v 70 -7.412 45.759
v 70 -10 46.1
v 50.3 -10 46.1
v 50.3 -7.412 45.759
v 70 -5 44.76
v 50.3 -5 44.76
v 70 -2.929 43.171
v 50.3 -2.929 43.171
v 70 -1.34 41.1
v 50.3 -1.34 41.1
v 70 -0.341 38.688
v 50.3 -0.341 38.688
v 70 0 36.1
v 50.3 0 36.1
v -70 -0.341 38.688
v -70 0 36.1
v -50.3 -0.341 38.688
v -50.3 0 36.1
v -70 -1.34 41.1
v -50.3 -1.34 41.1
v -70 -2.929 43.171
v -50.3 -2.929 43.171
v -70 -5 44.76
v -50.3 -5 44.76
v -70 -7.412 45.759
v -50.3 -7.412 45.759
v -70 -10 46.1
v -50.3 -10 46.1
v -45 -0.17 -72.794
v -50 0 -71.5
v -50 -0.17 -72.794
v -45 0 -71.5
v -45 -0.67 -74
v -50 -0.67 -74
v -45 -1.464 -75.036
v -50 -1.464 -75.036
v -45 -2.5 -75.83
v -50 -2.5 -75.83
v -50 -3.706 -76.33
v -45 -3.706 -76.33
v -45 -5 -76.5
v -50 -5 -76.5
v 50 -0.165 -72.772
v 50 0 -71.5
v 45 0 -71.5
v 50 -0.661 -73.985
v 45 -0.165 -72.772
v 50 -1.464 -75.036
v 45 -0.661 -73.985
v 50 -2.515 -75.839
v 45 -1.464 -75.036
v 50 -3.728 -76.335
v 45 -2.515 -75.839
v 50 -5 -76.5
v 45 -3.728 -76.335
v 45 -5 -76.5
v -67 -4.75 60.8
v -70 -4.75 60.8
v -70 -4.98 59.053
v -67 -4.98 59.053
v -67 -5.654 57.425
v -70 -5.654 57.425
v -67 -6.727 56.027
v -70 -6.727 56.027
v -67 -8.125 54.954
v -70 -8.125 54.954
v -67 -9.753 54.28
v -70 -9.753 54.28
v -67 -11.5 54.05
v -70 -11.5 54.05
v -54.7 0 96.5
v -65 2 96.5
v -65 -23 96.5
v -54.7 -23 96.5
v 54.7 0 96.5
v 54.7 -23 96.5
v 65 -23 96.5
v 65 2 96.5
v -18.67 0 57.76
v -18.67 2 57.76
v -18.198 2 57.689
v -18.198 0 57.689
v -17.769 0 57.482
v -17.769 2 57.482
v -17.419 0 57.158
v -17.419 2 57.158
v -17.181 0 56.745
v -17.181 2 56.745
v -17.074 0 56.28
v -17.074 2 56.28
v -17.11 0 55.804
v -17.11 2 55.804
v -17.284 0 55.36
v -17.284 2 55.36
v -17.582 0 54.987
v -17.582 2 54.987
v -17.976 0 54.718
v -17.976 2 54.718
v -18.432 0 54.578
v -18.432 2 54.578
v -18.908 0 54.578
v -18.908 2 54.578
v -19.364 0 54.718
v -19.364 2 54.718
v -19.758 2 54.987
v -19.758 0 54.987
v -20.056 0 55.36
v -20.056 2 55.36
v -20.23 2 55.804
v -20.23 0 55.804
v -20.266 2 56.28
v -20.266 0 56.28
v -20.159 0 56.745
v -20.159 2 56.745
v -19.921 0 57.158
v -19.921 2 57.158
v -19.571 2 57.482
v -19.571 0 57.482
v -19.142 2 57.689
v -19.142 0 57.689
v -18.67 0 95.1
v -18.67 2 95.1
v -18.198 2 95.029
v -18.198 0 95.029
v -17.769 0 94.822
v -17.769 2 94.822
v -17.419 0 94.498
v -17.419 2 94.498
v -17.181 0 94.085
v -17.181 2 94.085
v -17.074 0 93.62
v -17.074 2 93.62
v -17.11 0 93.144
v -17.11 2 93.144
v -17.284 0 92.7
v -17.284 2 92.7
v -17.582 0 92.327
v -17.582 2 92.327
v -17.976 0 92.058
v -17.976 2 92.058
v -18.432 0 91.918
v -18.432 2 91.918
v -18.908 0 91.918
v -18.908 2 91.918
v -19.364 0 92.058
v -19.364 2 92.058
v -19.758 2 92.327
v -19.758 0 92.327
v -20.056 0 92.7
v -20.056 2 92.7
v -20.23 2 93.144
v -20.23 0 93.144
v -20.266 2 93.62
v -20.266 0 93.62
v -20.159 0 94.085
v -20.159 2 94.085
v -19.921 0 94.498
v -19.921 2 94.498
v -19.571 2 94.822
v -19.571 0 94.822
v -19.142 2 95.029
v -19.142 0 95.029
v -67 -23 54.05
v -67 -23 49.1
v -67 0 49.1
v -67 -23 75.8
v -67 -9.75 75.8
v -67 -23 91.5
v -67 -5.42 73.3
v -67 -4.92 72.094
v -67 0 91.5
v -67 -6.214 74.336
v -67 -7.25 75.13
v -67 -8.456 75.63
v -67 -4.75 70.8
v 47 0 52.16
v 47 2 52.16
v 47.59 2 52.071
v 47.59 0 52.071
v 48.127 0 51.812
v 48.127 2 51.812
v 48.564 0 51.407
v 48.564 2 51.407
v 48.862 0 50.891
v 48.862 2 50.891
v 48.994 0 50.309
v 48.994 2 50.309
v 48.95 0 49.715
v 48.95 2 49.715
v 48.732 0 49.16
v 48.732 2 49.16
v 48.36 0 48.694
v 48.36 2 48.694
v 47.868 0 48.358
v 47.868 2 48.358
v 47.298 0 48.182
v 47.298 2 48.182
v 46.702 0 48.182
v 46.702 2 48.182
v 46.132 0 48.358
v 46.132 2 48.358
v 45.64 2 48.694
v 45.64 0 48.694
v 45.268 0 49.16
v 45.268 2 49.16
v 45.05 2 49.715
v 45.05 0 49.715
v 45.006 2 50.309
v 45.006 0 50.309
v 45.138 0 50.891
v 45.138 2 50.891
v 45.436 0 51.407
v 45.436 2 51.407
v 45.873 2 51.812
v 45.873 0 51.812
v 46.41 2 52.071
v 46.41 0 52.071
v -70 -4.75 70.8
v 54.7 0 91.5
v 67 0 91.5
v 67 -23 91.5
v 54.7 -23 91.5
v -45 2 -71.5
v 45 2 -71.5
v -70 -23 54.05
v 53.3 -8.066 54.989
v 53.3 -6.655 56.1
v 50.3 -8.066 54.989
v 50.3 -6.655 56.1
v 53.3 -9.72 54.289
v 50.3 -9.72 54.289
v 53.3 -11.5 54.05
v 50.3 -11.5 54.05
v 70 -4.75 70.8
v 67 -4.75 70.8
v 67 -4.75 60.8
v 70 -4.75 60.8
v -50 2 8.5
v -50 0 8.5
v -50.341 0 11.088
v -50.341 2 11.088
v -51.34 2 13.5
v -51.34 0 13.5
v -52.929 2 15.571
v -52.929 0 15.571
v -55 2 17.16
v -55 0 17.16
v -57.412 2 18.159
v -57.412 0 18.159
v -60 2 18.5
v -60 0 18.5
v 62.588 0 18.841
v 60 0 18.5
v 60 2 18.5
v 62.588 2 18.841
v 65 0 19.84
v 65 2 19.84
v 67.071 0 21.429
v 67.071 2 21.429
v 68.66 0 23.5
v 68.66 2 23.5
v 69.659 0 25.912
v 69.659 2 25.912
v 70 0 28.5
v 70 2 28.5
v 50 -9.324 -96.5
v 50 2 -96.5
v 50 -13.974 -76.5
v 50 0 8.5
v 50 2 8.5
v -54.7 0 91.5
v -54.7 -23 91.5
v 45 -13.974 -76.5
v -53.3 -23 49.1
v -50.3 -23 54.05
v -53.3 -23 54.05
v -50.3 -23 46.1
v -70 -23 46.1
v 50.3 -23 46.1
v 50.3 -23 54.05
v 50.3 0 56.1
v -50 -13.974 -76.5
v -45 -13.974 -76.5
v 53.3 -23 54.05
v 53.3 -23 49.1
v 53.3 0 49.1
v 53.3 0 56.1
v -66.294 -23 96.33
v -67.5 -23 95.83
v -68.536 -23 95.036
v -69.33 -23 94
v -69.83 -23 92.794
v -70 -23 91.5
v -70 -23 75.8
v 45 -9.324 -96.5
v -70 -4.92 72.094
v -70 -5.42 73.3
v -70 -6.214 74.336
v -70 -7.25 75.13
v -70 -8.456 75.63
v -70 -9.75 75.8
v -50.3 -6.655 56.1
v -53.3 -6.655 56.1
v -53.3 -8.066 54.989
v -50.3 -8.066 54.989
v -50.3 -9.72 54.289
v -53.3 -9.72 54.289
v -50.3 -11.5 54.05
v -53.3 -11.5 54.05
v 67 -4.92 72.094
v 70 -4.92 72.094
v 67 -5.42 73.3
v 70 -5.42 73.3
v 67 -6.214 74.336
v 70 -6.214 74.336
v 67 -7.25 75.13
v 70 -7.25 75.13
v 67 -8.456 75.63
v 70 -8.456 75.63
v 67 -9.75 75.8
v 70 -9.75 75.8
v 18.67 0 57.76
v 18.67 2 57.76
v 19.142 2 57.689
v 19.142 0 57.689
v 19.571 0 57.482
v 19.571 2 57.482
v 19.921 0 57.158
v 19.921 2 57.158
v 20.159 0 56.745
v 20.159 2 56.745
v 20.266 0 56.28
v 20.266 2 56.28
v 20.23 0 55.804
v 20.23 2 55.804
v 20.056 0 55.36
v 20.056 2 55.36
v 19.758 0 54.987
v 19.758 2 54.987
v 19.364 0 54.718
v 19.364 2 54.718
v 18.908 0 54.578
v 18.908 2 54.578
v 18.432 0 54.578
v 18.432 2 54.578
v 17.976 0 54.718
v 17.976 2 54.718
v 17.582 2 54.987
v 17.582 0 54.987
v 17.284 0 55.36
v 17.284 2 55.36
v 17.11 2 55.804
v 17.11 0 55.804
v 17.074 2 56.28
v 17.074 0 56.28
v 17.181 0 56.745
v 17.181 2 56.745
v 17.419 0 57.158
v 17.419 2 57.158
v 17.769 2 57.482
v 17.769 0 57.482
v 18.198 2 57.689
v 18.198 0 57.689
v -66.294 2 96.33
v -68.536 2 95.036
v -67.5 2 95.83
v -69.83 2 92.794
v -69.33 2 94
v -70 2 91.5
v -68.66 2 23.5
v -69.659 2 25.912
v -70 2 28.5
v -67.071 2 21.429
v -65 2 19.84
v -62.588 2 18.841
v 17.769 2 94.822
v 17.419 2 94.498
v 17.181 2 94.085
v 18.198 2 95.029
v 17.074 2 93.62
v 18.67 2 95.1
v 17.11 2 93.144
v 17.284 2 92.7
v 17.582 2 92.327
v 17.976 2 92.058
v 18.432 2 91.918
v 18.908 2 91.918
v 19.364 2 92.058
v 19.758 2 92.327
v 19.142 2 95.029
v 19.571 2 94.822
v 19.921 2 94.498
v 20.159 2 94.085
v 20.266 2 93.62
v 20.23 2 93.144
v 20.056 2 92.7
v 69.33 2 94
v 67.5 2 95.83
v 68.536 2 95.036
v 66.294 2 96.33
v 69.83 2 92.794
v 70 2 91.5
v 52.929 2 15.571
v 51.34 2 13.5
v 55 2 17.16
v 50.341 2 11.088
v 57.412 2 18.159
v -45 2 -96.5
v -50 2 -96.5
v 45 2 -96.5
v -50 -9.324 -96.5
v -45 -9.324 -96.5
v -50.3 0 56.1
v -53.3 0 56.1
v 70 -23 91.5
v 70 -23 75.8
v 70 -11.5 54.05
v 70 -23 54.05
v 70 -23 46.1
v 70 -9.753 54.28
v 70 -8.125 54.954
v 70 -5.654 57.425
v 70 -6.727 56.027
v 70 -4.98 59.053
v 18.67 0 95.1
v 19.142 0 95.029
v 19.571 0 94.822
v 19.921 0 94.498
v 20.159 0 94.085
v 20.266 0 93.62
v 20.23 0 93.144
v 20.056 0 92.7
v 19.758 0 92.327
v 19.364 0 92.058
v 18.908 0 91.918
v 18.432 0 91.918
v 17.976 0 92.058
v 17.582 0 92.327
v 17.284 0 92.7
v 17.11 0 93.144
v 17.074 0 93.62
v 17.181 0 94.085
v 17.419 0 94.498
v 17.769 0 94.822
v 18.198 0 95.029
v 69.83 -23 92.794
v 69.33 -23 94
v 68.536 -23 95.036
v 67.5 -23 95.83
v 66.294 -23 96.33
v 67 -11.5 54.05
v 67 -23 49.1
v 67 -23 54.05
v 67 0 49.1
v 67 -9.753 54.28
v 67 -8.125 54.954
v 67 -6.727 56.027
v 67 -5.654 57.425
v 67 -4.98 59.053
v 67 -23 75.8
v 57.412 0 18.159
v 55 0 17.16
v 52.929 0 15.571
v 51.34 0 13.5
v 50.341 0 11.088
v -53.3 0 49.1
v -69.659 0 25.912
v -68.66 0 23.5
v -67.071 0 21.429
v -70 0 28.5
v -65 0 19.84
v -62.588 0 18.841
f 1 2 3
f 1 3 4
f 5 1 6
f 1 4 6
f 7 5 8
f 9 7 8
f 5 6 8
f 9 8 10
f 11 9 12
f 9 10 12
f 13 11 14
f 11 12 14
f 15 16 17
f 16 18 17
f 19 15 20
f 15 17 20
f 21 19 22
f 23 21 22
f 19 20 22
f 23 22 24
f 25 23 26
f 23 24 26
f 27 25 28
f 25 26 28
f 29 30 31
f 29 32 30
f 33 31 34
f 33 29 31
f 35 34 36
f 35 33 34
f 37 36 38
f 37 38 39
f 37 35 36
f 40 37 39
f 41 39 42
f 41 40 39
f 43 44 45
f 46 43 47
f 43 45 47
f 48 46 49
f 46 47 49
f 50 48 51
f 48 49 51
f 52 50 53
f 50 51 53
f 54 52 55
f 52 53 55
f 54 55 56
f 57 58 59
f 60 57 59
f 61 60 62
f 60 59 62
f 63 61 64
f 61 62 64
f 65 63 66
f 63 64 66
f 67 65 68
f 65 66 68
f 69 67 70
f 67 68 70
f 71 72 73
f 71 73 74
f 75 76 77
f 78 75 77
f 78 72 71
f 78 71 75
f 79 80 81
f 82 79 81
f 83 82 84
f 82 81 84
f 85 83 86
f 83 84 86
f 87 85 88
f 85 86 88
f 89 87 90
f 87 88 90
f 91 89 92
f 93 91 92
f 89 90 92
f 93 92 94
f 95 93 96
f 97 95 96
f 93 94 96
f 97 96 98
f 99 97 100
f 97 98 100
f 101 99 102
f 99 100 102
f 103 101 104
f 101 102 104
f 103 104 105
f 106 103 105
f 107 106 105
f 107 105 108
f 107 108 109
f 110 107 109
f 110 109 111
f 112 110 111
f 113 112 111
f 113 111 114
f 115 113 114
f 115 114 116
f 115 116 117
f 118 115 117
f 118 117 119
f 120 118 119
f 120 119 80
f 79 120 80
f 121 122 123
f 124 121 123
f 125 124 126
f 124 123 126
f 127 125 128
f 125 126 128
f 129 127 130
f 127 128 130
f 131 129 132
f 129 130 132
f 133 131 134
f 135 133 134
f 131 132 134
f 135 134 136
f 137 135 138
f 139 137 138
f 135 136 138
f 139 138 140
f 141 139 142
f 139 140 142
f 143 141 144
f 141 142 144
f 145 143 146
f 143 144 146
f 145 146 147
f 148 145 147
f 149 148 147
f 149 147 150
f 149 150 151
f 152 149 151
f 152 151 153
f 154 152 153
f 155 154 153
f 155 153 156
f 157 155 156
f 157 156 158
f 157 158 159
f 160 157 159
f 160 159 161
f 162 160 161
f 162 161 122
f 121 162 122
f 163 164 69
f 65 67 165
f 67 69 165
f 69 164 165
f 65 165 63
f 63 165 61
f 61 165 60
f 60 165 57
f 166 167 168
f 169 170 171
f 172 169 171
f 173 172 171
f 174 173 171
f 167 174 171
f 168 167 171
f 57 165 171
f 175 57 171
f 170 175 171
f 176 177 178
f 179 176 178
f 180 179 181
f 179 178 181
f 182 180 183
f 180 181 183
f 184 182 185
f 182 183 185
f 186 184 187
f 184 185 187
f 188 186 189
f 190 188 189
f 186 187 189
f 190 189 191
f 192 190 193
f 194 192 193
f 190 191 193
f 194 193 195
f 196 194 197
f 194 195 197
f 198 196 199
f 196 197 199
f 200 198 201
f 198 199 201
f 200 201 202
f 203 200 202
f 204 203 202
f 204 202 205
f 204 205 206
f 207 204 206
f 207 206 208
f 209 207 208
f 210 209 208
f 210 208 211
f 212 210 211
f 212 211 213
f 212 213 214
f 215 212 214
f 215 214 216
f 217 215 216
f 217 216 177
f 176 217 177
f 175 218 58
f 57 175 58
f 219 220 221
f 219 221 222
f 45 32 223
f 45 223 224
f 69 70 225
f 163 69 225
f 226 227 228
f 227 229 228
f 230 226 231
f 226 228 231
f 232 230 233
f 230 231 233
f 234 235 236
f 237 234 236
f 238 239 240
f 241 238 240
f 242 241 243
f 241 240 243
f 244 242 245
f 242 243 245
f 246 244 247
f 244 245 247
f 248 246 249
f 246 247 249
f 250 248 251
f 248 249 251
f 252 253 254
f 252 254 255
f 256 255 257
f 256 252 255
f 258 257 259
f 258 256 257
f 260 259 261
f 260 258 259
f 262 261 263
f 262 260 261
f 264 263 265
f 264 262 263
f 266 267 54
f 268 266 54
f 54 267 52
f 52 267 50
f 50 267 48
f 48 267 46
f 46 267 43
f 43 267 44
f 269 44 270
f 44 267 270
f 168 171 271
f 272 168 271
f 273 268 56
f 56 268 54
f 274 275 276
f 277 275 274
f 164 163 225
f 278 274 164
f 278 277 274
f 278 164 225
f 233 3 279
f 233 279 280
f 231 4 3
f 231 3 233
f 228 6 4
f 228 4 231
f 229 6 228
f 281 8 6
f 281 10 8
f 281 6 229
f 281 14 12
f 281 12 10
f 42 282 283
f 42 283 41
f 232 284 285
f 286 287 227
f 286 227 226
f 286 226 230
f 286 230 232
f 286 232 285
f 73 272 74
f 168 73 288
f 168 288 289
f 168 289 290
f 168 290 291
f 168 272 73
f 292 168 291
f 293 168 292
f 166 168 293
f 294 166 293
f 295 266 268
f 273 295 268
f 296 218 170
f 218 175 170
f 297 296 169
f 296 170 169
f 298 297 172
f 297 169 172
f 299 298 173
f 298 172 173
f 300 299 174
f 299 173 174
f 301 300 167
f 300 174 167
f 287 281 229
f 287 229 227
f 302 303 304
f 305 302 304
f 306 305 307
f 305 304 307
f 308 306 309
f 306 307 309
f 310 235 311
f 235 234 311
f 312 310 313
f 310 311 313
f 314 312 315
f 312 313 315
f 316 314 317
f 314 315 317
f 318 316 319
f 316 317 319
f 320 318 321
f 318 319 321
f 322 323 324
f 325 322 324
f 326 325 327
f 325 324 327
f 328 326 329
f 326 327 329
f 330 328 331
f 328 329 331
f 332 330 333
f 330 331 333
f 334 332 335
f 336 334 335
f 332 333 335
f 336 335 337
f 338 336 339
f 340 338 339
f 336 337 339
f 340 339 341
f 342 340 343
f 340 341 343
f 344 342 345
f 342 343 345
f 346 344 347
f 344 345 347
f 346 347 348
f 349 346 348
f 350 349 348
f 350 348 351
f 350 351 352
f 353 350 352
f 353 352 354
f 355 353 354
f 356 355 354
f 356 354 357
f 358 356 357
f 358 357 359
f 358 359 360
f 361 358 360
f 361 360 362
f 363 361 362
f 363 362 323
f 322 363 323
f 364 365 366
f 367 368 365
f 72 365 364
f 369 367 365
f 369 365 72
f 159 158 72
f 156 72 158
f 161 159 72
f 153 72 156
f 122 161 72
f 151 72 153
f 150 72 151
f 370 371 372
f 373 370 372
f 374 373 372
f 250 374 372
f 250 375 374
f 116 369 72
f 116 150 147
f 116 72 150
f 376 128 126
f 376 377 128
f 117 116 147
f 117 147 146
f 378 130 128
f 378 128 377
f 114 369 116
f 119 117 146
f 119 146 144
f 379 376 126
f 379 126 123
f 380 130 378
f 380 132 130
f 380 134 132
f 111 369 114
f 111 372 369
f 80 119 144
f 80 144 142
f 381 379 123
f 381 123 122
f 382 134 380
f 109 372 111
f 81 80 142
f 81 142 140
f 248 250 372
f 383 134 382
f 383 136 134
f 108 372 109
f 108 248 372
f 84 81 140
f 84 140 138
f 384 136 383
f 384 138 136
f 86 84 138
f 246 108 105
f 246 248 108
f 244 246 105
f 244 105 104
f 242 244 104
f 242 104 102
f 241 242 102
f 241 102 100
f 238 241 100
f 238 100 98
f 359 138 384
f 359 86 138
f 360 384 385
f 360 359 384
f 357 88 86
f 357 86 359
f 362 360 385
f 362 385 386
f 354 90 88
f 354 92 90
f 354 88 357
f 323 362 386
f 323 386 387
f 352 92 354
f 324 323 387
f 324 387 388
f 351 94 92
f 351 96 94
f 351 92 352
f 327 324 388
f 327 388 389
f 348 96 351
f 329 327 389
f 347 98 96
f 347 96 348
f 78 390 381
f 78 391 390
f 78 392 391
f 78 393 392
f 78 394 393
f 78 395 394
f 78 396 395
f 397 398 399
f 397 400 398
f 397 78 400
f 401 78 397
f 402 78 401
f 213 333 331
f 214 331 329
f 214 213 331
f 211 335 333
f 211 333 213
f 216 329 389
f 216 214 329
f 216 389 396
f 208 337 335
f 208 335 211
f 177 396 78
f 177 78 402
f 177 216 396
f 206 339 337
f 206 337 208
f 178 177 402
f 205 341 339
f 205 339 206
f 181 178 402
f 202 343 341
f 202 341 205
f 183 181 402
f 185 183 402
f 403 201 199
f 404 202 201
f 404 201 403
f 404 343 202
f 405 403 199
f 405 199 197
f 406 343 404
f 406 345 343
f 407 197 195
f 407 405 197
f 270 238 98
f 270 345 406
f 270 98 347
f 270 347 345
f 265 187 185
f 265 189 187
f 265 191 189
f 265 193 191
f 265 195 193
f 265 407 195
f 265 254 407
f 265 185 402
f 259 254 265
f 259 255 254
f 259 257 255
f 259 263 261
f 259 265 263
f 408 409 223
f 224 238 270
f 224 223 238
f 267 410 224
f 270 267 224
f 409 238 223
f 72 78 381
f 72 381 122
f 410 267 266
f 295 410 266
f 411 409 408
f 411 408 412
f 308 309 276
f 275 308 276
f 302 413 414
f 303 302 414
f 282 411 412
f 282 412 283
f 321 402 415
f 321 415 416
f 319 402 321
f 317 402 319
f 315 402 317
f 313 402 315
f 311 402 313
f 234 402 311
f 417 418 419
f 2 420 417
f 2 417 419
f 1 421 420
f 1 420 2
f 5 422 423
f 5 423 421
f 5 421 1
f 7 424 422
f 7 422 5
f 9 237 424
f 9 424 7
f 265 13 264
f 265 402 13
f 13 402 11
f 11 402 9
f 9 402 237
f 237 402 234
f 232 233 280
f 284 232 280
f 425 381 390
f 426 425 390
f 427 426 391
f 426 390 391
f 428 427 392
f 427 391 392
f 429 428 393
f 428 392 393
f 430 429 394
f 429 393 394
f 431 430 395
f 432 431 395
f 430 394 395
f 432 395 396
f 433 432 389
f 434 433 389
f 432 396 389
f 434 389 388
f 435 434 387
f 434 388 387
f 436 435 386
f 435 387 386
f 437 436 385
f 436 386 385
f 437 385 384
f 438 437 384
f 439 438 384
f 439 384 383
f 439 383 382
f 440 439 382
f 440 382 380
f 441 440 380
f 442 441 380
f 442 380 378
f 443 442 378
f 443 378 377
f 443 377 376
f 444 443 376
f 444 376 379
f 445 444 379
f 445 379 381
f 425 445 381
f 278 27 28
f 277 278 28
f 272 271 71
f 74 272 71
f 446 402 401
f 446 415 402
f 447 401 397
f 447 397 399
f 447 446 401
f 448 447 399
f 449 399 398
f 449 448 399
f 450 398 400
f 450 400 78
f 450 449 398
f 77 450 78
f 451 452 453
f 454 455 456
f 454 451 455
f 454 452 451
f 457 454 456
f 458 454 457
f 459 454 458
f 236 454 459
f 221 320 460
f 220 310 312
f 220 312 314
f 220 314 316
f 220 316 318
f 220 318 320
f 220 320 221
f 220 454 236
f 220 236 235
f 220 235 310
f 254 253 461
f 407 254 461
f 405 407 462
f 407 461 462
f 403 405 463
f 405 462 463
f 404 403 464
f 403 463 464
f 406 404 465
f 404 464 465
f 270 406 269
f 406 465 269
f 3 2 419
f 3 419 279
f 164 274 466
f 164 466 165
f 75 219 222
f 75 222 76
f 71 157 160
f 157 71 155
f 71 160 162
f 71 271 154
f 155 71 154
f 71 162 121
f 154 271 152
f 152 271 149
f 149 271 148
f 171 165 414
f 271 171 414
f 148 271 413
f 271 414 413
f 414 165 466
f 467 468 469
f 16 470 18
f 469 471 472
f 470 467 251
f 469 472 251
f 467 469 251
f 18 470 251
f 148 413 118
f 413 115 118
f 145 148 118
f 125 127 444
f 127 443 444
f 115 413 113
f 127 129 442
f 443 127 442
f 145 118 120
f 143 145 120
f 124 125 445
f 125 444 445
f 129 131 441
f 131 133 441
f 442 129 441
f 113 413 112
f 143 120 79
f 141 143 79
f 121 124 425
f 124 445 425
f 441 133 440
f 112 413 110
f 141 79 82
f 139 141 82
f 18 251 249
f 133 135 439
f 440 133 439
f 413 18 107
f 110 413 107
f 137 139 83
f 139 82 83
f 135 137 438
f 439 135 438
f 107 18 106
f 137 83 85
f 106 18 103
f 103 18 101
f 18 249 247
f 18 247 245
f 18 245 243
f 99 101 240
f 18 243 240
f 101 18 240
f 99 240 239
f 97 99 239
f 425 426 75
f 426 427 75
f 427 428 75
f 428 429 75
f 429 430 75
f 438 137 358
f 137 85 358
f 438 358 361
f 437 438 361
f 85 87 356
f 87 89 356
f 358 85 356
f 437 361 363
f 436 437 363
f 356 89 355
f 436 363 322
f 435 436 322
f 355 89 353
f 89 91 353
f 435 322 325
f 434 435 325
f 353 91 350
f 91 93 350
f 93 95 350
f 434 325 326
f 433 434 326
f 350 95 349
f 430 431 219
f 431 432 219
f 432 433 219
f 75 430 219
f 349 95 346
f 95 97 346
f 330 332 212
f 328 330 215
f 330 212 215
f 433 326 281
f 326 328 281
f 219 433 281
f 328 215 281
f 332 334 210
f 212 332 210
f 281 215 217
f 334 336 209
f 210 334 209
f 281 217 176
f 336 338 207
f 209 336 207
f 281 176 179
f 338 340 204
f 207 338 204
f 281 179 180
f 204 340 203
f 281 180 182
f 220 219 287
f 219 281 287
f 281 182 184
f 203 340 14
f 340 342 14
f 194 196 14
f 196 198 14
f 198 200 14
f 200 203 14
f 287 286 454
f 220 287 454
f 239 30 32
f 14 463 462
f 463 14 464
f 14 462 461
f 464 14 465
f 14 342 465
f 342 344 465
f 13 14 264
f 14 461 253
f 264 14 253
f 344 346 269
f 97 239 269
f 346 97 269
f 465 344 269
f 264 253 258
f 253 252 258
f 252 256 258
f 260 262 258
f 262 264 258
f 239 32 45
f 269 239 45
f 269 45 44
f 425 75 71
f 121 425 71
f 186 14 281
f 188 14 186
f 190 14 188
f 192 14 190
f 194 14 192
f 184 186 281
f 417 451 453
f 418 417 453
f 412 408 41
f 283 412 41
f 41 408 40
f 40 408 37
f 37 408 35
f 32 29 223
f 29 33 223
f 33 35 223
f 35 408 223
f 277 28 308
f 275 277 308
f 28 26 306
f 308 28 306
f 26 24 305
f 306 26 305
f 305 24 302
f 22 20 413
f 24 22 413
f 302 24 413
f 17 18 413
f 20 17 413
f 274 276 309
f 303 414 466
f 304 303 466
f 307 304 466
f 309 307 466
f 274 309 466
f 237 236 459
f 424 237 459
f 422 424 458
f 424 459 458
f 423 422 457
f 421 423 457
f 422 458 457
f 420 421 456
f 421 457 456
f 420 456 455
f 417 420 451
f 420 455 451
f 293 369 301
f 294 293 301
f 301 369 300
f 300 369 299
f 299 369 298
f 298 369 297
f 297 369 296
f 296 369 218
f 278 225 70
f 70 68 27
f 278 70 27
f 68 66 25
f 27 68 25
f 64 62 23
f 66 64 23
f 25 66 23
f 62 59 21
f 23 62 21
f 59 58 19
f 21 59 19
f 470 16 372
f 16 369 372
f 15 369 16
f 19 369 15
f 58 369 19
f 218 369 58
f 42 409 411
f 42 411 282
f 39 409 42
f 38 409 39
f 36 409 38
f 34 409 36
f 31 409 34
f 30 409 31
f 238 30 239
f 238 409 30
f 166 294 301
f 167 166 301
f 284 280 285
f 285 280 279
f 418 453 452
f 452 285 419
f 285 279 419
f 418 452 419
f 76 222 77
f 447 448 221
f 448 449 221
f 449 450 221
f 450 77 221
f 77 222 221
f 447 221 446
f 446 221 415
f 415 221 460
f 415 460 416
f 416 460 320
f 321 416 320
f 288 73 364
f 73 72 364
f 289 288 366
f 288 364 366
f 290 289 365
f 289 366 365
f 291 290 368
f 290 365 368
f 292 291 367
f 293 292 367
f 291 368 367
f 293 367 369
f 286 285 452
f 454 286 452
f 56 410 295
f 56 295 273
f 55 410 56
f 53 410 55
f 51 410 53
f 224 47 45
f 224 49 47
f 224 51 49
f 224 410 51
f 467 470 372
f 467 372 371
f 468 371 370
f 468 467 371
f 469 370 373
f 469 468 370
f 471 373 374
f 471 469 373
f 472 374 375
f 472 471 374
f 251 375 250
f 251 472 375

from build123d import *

# Parameters (mm, degrees)
SKETCH_1_W             = 140
SKETCH_1_H             = 193
EXTRUDE_1_DEPTH        = 2
SKETCH_2_R             = 1.6
CUT_EXTRUDE_1_DEPTH    = 120.231916868
EXTRUDE_2_DEPTH        = 23
CUT_EXTRUDE_2_DEPTH    = 172.584527274
FILLET_1_R             = 5
FILLET_2_R             = 10
SKETCH_5_R             = 2
CUT_EXTRUDE_3_DEPTH    = 122.808250952
FILLET_3_R             = 5
SKETCH_6_W             = 20
SKETCH_6_H             = 115
CUT_EXTRUDE_4_DEPTH    = 122.808250952
FILLET_START           = -23
FILLET_4_DEPTH         = 26
FILLET_4_2_DEPTH       = 2
SKETCH_7_W             = 90
SKETCH_7_H             = 25
CUT_EXTRUDE_5_DEPTH    = 122.413549491
EXTRUDE_5_DEPTH        = 5
FILLET_8_R             = 5
FILLET_8_OF_MIRROR_3_R = 5


with BuildPart() as part:
    # 스케치1 → 보스-돌출1 (new body)
    with BuildSketch(Plane(origin=(0, 0, 0), x_dir=(1, 0, 0), z_dir=(0, 1, 0))):
        Rectangle(SKETCH_1_W, SKETCH_1_H)
    extrude(amount=EXTRUDE_1_DEPTH)

    # 스케치2 → 컷-돌출1 (cut, through all)
    with BuildSketch(Plane(origin=(0, 2, 0), x_dir=(1, 0, 0), z_dir=(0, 1, 0))):
        with Locations(Location((-18.67, -93.5, 0), (0, 0, 270))):
            Circle(SKETCH_2_R)
        with Locations(Location((18.67, -93.5, 0), (0, 0, 270))):
            Circle(SKETCH_2_R)
        with Locations(Location((18.67, -56.16, 0), (0, 0, 270))):
            Circle(SKETCH_2_R)
        with Locations(Location((-18.67, -56.16, 0), (0, 0, 270))):
            Circle(SKETCH_2_R)
    extrude(amount=-CUT_EXTRUDE_1_DEPTH, mode=Mode.SUBTRACT)

    # 스케치3 → 보스-돌출2 (add)
    with BuildSketch(Plane(origin=(0, 0, 0), x_dir=(-1, 0, 0), z_dir=(0, -1, 0))):
        Polygon((70, -96.5), (70, -46.1), (50.3, -46.1), (50.3, -56.1), (53.3, -56.1), (53.3, -49.1), (67, -49.1), (67, -91.5), (54.7, -91.5), (54.7, -96.5), align=None)
    extrude_2 = extrude(amount=EXTRUDE_2_DEPTH)

    # 대칭 복사1: 보스-돌출2 across plane
    add(extrude_2.mirror(Plane(origin=(0, 0, 0), x_dir=(0, 0, 1), z_dir=(1, 0, 0))))

    # 스케치4 → 컷-돌출2 (cut, through all)
    with BuildSketch(Plane.ZY.offset(70)):
        with BuildLine():
            Line((54.05, -11.5), (54.05, -23))
            Line((54.05, -23), (75.8, -23))
            Line((75.8, -23), (75.8, -4.75))
            Line((75.8, -4.75), (60.8, -4.75))
            ThreePointArc((60.8, -4.75), (56.027029227, -6.727029227), (54.05, -11.5))
        make_face()
    extrude(amount=-CUT_EXTRUDE_2_DEPTH, mode=Mode.SUBTRACT)

    # 필렛1
    fillet_1_edges = [part.edges().sort_by_distance(p)[0] for p in [
        (-68.5, -4.75, 75.8),
        (68.5, -4.75, 75.8),
    ]]
    fillet(fillet_1_edges, radius=FILLET_1_R)

    # 필렛2
    fillet_2_edges = [part.edges().sort_by_distance(p)[0] for p in [
        (-60.15, 0, 46.1),
        (60.15, 0, 46.1),
    ]]
    fillet(fillet_2_edges, radius=FILLET_2_R)

    # 스케치5 → 컷-돌출3 (cut, through all)
    with BuildSketch(Plane(origin=(0, 2, 0), x_dir=(1, 0, 0), z_dir=(0, 1, 0))):
        with Locations(Location((47, -50.16, 0), (0, 0, 270))):
            Circle(SKETCH_5_R)
    extrude(amount=-CUT_EXTRUDE_3_DEPTH, mode=Mode.SUBTRACT)

    # 필렛3
    fillet_3_edges = [part.edges().sort_by_distance(p)[0] for p in [
        (70, -10.5, 96.5),
        (-70, -10.5, 96.5),
    ]]
    fillet(fillet_3_edges, radius=FILLET_3_R)

    # 스케치6 → 컷-돌출4 (cut, through all)
    with BuildSketch(Plane(origin=(0, 2, 0), x_dir=(1, 0, 0), z_dir=(0, 1, 0))):
        with Locations((-60, 39)):
            Rectangle(SKETCH_6_W, SKETCH_6_H)
        with Locations((60, 39)):
            Rectangle(SKETCH_6_W, SKETCH_6_H)
    extrude(amount=-CUT_EXTRUDE_4_DEPTH, mode=Mode.SUBTRACT)

    # 필렛4: read off the stored shape, not the designer's step
    # 필렛4 outline → 필렛4 (cut)
    with BuildSketch(Plane(origin=(0, 0, 0), x_dir=(1, 0, 0), z_dir=(0, 1, 0)).offset(FILLET_START)):
        with BuildLine():
            Line((70, -18.5), (60, -18.5))
            ThreePointArc((60, -18.5), (67.071067812, -21.428932188), (70, -28.5))
            Line((70, -28.5), (70, -18.5))
        make_face()
        with BuildLine():
            ThreePointArc((-70, -28.5), (-67.071067812, -21.428932188), (-60, -18.5))
            Line((-60, -18.5), (-70, -18.5))
            Line((-70, -18.5), (-70, -28.5))
        make_face()
    extrude(amount=FILLET_4_DEPTH, mode=Mode.SUBTRACT)

    # Fillet 4 2 outline → Fillet 4 2 (add)
    with BuildSketch(Plane(origin=(0, 0, 0), x_dir=(1, 0, 0), z_dir=(0, 1, 0))):
        with BuildLine():
            Line((50, -18.5), (60, -18.5))
            ThreePointArc((60, -18.5), (52.928932188, -15.571067812), (50, -8.5))
            Line((50, -8.5), (50, -18.5))
        make_face()
        with BuildLine():
            ThreePointArc((-50, -8.5), (-52.928932188, -15.571067812), (-60, -18.5))
            Line((-60, -18.5), (-50, -18.5))
            Line((-50, -18.5), (-50, -8.5))
        make_face()
    extrude(amount=FILLET_4_2_DEPTH)

    # 스케치7 → 컷-돌출5 (cut, through all)
    with BuildSketch(Plane.XZ):
        with Locations((0, -84)):
            Rectangle(SKETCH_7_W, SKETCH_7_H)
    extrude(amount=-CUT_EXTRUDE_5_DEPTH, mode=Mode.SUBTRACT)

    # 스케치11 → 보스-돌출5 (add)
    with BuildSketch(Plane.ZY.offset(50)):
        Polygon((-96.5, 0), (-96.5, -9.324233381), (-76.5, -13.973838302), (-76.5, 0), align=None)
    extrude_5 = extrude(amount=-EXTRUDE_5_DEPTH)

    # 필렛8
    fillet_8_edges = [part.edges().sort_by_distance(p)[0] for p in [
        (-47.5, 0, -76.5),
    ]]
    fillet(fillet_8_edges, radius=FILLET_8_R)

    # 대칭 복사3: 보스-돌출5 across plane
    add(extrude_5.mirror(Plane(origin=(0, 0, 0), x_dir=(0, 0, 1), z_dir=(1, 0, 0))))

    # 필렛8 of 대칭 복사3
    fillet_8_of_mirror_3_edges = [part.edges().sort_by_distance(p)[0] for p in [
        (47.5, 0, -76.5),
    ]]
    fillet(fillet_8_of_mirror_3_edges, radius=FILLET_8_OF_MIRROR_3_R)


solid = part.part
